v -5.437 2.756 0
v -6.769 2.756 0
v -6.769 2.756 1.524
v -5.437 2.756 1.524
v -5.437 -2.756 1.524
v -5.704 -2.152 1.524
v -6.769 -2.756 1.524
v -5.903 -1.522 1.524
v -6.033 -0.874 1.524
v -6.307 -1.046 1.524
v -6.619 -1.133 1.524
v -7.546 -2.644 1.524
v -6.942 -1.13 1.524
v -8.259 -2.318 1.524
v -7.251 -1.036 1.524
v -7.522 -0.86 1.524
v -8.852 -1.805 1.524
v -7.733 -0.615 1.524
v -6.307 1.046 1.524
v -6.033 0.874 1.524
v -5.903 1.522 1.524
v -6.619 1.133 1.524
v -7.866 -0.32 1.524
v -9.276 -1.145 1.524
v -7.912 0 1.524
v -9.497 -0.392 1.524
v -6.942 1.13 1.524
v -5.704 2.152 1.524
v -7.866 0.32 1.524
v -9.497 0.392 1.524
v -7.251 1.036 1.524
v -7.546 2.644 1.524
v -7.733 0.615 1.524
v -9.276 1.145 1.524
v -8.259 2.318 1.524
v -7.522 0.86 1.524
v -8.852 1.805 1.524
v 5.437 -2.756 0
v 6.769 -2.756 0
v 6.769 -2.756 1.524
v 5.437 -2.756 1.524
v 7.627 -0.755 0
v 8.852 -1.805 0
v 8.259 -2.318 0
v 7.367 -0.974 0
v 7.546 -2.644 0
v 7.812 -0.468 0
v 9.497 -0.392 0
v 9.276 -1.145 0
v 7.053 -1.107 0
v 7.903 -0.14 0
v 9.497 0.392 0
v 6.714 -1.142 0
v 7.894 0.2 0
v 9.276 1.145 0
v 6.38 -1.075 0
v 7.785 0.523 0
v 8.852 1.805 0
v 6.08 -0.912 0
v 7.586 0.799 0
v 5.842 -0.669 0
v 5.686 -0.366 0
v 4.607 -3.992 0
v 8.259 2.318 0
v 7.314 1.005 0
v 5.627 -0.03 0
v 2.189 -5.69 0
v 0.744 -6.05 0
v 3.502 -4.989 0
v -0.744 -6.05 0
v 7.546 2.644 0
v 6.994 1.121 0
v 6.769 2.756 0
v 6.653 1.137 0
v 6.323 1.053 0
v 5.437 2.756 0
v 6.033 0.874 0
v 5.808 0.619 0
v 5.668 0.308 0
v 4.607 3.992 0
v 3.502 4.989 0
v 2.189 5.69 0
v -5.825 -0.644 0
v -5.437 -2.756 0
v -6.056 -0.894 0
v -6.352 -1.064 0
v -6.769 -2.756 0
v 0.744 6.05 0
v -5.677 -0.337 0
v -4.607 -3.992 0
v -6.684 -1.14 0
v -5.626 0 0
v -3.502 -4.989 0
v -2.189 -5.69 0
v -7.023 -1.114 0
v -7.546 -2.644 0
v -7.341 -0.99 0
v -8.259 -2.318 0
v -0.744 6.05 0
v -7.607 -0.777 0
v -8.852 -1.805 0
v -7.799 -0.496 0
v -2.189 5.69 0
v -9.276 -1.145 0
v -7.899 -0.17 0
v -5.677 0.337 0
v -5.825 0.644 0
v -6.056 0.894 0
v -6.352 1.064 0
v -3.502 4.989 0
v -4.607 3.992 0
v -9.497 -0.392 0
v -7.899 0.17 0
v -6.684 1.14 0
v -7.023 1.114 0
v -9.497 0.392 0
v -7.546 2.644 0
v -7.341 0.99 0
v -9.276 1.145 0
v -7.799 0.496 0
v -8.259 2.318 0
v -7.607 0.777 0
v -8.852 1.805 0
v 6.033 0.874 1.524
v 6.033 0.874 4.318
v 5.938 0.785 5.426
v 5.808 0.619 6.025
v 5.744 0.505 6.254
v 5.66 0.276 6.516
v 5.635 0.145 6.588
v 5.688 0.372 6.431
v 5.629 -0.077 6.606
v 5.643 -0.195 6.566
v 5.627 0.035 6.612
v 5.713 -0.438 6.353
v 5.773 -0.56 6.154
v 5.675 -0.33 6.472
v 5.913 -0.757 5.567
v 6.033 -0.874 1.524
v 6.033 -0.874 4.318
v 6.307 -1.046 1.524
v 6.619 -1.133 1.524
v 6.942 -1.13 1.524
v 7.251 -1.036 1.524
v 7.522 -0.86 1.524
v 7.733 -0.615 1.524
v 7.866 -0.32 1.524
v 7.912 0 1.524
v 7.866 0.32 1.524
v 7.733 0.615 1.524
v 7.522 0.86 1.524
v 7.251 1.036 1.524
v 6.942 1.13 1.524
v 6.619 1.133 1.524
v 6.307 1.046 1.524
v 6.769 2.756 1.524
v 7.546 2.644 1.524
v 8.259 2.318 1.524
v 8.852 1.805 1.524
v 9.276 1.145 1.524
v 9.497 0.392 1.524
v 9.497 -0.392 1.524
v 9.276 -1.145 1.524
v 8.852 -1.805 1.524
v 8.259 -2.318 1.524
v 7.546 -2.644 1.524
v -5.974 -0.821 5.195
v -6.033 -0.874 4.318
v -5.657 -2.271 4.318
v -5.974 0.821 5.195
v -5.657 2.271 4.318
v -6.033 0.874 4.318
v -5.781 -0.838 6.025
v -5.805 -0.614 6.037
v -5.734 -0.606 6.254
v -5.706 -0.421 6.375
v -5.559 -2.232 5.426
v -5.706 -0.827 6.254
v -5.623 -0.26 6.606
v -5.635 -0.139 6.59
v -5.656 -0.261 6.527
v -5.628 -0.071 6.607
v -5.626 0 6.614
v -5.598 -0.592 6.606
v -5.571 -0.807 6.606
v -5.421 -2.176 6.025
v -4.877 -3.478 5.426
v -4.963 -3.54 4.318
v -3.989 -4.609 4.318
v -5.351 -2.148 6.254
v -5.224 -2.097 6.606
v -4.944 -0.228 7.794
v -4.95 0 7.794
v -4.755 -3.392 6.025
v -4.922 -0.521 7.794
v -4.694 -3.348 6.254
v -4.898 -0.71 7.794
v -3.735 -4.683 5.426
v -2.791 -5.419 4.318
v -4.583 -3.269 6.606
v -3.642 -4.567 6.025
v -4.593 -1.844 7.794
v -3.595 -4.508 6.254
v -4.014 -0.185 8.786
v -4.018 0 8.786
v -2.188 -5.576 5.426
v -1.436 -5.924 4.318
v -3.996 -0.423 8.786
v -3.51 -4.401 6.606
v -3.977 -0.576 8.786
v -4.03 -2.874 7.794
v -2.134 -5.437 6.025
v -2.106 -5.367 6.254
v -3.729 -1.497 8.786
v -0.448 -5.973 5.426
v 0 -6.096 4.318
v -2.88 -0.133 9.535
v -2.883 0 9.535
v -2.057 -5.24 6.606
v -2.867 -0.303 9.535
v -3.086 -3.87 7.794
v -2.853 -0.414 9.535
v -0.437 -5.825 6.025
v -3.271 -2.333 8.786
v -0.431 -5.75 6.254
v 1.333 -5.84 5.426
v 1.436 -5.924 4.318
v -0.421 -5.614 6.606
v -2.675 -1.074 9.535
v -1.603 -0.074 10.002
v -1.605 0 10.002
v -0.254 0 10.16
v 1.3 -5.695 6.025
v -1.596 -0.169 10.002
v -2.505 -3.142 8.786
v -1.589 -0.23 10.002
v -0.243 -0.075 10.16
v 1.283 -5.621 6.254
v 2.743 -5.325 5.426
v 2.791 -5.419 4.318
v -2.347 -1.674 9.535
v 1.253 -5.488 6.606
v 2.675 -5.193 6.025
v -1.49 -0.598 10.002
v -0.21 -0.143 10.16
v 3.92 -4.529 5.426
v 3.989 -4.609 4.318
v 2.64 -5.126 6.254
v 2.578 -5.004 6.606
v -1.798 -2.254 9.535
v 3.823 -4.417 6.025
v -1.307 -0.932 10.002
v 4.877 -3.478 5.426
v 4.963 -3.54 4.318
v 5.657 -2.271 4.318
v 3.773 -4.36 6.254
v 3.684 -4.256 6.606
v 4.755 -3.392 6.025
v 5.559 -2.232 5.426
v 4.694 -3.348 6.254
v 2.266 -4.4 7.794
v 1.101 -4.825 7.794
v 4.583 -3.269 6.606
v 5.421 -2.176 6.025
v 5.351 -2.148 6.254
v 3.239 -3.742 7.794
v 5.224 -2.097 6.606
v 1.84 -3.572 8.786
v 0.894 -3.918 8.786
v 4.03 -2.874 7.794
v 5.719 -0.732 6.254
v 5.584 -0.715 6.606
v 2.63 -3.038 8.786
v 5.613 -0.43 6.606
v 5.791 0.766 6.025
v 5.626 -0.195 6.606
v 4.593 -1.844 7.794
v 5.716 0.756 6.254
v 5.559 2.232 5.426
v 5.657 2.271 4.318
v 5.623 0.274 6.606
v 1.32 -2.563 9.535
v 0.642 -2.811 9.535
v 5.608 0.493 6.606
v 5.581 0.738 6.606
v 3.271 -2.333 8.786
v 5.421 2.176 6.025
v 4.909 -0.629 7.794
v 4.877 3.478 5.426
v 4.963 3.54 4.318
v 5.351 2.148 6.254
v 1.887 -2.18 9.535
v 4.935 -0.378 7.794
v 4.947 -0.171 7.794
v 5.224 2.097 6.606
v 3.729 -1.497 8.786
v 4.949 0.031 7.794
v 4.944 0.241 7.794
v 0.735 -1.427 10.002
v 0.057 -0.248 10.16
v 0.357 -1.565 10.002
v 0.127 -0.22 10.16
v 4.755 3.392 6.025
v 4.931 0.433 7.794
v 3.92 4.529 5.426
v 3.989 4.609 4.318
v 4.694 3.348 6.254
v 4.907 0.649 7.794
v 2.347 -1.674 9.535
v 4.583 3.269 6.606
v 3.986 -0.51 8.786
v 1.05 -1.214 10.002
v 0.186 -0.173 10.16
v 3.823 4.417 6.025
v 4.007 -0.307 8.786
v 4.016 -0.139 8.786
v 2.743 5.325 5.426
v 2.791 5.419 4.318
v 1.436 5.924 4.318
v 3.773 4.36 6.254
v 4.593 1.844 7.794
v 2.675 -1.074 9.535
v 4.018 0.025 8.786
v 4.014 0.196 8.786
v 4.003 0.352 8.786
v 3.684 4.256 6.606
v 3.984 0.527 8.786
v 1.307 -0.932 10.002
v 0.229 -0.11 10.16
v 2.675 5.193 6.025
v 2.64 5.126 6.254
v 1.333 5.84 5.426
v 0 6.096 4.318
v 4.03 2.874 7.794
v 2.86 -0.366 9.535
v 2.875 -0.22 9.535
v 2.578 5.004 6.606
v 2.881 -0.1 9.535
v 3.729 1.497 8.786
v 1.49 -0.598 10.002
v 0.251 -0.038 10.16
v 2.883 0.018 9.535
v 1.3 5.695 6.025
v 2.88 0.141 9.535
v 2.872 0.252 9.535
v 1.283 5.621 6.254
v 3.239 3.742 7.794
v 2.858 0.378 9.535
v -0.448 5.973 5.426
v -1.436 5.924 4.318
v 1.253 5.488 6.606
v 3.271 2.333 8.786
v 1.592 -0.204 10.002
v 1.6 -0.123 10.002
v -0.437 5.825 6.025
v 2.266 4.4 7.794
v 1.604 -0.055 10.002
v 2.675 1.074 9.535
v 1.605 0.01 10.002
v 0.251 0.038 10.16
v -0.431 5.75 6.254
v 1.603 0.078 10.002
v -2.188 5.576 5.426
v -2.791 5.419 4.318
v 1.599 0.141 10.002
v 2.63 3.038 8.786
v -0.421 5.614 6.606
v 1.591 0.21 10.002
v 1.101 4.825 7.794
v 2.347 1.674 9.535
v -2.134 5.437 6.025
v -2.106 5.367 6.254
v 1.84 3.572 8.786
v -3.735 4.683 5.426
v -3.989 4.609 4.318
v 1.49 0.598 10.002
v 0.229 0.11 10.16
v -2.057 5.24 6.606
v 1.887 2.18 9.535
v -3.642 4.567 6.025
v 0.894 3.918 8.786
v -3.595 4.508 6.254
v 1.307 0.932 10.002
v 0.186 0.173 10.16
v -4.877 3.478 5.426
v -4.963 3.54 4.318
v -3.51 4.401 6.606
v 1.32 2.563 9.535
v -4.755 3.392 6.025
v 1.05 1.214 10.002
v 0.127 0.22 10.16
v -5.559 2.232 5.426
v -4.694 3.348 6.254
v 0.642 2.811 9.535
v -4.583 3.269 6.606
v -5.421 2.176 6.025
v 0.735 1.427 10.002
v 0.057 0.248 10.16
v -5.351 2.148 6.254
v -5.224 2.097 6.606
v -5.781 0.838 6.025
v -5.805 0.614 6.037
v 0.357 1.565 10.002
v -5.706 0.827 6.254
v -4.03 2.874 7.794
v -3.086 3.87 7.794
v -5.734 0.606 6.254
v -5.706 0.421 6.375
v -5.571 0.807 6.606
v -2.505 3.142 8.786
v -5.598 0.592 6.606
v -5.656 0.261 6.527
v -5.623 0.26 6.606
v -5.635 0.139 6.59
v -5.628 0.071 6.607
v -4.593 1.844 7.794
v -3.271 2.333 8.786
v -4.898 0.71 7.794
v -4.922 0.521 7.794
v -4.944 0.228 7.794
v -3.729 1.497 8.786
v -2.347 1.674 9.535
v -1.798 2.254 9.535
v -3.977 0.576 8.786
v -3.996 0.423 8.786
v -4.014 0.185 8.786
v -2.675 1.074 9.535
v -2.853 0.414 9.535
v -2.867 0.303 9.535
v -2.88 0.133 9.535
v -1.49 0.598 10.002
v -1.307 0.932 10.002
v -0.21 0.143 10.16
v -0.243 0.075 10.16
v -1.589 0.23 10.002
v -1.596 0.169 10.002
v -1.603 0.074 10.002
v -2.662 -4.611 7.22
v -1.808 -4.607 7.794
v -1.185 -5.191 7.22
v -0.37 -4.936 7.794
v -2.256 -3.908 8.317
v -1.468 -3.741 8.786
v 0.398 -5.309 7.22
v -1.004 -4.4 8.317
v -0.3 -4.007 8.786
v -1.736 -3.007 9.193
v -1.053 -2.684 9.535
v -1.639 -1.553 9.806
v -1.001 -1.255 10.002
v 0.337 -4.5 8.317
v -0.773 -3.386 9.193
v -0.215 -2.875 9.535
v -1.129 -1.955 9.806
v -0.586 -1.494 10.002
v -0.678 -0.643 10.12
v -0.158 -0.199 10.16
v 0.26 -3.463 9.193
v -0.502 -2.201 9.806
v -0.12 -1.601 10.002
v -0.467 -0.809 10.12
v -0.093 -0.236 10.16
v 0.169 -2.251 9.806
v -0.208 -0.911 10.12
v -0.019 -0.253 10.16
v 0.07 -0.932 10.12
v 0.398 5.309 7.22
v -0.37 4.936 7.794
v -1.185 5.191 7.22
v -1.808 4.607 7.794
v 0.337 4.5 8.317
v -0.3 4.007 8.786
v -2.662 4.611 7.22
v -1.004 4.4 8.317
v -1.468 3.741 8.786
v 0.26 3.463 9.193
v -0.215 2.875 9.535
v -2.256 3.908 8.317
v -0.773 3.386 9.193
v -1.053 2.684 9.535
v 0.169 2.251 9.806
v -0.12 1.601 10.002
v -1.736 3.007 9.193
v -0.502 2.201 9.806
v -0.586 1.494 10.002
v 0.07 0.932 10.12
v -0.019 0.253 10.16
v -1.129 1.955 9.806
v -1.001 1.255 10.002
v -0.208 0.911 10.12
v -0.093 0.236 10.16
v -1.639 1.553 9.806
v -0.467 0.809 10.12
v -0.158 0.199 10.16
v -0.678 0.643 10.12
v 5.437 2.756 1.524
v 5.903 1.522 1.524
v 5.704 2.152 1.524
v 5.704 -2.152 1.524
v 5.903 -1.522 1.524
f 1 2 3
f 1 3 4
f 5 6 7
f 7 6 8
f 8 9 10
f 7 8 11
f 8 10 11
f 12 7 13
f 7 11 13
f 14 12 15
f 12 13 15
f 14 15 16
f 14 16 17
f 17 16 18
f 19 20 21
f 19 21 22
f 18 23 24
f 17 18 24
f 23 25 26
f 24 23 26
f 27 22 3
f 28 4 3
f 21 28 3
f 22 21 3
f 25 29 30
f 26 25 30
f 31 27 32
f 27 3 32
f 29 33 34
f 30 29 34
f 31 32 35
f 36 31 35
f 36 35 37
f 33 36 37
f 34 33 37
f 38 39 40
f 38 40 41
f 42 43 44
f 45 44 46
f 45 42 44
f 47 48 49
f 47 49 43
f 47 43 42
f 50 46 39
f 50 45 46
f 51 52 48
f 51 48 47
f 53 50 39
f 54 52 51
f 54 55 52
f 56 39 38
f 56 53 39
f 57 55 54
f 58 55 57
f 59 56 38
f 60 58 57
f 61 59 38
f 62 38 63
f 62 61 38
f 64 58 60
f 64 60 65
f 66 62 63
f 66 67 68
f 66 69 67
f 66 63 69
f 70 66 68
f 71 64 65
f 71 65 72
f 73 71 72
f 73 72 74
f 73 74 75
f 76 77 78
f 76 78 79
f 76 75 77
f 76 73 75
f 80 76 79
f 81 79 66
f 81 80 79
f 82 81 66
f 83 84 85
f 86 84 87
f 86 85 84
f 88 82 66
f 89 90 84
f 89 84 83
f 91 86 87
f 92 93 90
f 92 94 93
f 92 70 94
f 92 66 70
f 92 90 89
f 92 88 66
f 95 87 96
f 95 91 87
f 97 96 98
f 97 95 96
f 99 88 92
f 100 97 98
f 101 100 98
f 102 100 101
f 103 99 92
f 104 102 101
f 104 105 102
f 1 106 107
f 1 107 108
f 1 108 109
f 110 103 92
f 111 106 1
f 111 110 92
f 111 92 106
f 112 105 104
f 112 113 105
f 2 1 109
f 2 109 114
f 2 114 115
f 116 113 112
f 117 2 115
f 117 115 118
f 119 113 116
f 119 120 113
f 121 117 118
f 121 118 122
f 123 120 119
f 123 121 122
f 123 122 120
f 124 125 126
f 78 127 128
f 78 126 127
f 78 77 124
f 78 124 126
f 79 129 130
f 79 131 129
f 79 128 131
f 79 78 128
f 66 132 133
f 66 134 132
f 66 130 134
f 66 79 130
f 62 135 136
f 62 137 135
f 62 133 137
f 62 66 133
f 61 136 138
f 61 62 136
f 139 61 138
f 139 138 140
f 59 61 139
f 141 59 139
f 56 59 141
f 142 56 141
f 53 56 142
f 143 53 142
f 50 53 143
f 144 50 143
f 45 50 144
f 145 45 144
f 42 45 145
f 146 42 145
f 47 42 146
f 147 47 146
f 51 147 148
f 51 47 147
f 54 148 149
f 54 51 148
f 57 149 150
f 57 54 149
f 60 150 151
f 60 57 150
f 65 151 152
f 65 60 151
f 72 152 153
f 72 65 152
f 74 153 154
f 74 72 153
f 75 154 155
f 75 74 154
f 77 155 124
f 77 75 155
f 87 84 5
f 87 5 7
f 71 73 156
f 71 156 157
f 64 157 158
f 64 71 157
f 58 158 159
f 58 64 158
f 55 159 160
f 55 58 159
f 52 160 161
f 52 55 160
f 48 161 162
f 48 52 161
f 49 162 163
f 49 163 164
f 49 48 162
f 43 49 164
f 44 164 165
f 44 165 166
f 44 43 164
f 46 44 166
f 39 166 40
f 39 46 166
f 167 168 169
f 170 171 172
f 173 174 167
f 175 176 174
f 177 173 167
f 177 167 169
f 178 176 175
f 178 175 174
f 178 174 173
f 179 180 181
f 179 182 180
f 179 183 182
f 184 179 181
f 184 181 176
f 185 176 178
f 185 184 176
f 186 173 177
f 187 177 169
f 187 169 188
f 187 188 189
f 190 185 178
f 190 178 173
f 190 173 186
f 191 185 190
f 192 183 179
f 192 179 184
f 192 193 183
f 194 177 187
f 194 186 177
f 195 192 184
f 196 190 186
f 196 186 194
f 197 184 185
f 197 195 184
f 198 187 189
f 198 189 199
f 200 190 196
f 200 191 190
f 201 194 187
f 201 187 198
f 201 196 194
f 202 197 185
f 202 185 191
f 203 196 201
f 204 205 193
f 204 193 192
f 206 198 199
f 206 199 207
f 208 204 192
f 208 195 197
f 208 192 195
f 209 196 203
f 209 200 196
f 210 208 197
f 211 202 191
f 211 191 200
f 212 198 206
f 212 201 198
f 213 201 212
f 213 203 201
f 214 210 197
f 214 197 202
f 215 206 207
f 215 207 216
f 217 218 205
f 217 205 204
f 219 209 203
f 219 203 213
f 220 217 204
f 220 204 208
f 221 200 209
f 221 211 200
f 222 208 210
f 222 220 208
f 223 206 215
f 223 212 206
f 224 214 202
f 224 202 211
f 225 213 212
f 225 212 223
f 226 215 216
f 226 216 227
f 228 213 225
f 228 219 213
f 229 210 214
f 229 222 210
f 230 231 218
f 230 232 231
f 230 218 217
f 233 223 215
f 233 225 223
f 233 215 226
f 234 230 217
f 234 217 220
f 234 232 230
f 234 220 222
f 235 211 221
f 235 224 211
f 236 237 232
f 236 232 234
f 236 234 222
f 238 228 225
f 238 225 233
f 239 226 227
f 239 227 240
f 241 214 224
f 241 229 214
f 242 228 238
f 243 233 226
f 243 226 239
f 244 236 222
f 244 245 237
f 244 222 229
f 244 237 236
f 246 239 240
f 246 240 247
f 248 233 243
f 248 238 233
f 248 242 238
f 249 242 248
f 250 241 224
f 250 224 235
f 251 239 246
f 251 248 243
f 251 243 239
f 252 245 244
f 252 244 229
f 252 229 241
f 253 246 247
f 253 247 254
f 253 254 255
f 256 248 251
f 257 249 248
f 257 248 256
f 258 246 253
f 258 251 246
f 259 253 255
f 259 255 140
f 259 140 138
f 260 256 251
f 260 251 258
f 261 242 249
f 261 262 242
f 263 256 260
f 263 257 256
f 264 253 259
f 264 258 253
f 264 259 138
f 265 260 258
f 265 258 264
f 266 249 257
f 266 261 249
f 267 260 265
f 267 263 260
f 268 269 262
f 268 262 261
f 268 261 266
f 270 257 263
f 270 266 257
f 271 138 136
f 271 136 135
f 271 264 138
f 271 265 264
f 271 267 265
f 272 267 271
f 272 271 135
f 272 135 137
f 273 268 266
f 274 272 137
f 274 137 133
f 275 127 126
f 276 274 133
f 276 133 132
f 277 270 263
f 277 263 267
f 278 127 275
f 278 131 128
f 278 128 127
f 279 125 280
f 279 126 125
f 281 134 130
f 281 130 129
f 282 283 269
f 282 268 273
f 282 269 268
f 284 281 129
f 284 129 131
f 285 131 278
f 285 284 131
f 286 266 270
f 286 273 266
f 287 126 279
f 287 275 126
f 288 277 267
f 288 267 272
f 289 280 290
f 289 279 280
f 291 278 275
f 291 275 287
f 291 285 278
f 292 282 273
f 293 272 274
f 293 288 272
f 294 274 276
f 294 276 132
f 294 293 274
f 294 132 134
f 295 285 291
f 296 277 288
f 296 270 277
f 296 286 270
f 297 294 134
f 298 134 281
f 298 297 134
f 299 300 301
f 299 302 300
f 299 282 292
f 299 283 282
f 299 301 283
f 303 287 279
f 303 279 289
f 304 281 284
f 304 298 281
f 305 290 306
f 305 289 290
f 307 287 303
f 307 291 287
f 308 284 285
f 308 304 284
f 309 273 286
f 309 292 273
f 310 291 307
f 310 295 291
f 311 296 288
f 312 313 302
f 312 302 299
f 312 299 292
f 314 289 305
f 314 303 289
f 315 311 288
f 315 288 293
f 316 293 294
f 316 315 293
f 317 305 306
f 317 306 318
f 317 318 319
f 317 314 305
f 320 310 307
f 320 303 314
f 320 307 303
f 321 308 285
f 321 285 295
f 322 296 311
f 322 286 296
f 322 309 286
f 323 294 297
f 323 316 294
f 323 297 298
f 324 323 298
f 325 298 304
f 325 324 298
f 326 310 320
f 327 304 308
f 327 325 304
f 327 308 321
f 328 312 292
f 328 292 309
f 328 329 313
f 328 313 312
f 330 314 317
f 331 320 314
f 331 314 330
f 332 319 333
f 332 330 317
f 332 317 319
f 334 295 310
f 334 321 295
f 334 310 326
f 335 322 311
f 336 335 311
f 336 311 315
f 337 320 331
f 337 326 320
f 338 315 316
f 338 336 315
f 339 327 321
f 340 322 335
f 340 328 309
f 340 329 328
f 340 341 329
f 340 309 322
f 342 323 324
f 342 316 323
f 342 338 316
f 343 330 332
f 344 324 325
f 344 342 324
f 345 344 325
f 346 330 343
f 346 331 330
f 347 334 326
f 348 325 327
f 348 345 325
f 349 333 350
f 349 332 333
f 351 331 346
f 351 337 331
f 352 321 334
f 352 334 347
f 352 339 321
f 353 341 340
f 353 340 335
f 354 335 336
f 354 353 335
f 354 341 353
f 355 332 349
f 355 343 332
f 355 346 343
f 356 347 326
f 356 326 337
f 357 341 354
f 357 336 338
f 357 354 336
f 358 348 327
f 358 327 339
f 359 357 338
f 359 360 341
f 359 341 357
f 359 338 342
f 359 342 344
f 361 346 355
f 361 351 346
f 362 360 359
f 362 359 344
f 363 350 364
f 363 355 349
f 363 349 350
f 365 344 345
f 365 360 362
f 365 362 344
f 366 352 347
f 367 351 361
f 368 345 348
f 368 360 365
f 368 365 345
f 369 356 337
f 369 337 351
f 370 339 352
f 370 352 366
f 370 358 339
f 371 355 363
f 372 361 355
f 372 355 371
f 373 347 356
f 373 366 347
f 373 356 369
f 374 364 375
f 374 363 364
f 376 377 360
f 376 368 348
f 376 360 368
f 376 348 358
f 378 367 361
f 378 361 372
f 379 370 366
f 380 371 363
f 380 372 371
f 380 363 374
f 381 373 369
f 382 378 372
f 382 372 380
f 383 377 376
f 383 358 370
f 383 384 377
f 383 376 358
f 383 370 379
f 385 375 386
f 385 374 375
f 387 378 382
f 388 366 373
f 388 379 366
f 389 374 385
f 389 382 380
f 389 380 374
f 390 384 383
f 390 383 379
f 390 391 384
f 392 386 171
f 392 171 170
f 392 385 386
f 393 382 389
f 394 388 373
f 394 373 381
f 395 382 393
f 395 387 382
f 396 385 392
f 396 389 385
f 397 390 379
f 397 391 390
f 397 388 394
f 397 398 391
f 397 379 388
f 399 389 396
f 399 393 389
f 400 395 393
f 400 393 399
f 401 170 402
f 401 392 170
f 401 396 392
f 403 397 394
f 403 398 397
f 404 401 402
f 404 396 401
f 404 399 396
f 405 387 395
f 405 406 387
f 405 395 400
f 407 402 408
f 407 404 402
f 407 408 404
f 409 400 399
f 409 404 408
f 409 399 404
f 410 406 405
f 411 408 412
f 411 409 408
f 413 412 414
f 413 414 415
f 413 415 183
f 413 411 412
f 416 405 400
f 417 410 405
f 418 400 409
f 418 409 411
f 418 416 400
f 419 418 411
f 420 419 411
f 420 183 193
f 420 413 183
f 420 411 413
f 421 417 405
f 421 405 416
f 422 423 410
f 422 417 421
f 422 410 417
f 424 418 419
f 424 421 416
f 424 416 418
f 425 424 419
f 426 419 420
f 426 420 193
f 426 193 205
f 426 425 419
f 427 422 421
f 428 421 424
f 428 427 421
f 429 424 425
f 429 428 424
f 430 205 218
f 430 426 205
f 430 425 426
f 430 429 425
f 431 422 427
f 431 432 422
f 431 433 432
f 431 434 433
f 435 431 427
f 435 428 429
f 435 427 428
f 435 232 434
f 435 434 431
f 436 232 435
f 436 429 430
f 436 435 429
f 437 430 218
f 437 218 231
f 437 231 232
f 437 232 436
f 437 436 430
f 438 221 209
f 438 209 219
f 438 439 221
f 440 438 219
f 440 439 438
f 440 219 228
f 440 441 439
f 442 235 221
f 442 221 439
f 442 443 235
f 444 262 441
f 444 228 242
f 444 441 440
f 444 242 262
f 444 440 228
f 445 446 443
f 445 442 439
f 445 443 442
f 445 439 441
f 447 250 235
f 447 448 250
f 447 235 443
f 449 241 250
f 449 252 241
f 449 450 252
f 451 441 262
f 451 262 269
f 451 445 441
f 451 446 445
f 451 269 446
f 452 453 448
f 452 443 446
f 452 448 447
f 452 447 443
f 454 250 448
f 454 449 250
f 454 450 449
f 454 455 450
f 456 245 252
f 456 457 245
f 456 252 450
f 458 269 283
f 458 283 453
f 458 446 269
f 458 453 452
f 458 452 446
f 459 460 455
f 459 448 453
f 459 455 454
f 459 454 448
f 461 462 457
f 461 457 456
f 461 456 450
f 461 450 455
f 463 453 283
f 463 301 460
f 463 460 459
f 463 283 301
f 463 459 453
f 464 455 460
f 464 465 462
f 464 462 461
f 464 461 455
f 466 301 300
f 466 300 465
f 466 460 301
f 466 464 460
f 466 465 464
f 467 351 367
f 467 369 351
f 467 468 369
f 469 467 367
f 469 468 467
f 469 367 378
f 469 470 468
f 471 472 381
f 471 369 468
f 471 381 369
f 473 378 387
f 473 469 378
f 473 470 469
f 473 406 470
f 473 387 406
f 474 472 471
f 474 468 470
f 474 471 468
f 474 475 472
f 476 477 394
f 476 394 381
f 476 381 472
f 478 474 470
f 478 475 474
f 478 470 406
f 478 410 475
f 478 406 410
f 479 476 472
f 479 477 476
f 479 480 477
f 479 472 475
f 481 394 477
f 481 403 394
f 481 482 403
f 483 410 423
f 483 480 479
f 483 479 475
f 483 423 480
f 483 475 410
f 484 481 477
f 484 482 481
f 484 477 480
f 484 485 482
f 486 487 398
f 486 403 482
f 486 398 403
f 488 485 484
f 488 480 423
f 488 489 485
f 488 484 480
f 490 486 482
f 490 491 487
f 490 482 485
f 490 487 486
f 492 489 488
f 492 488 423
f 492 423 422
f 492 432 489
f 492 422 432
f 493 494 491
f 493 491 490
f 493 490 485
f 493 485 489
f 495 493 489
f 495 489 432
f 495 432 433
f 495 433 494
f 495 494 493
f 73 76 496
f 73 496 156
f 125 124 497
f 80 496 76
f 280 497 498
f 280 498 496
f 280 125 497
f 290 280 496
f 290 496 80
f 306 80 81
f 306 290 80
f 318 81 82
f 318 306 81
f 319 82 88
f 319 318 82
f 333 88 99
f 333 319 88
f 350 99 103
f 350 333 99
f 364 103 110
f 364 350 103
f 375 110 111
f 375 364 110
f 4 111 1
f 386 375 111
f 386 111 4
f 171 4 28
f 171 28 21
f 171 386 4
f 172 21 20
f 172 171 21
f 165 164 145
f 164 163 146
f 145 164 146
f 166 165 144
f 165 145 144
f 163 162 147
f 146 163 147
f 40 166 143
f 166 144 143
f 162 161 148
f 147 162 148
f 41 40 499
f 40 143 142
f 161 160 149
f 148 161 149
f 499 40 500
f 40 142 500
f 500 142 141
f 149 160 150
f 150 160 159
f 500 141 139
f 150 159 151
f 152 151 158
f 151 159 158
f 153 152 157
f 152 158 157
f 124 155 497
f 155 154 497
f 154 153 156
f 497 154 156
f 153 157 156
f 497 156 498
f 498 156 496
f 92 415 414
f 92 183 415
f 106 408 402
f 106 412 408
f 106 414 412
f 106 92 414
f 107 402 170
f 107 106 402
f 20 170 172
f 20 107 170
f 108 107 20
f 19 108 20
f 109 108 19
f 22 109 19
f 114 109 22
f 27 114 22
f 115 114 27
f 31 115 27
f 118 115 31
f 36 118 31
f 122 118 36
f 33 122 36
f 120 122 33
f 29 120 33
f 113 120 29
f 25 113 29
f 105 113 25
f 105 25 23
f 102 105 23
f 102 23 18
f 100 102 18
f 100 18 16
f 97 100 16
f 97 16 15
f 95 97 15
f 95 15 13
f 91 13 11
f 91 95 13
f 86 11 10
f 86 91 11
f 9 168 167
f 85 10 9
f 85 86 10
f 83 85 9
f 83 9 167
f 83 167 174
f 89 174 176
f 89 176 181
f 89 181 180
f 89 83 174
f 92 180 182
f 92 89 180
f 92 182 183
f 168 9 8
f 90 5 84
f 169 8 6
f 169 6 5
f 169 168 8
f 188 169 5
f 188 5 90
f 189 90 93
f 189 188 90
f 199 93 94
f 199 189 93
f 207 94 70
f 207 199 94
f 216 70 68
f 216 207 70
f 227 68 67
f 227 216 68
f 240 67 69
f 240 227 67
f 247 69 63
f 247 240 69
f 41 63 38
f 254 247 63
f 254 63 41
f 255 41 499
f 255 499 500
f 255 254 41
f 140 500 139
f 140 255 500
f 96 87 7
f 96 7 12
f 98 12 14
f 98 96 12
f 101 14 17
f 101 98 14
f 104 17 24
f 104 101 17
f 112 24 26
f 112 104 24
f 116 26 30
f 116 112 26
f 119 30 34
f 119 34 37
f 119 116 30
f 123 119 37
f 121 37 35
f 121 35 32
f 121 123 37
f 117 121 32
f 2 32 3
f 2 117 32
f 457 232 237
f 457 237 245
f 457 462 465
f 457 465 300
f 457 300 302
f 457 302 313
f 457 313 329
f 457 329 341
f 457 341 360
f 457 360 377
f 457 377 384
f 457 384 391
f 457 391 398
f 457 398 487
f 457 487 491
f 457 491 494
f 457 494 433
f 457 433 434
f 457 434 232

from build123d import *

# Parameters (mm, degrees)
BOSS_EXTRUDE1_DEPTH = 1.524
SKETCH4_R           = 1.143
CUT_EXTRUDE6_DEPTH  = 28.702


with BuildPart() as part:
    # Sketch1 → Boss-Extrude1 (new body)
    with BuildSketch(Plane.XY):
        with BuildLine():
            Line((6.7691, -2.7559), (-6.7691, -2.7559))
            ThreePointArc((-6.7691, -2.7559), (-9.525, 0), (-6.7691, 2.7559))
            Line((-6.7691, 2.7559), (6.7691, 2.7559))
            ThreePointArc((6.7691, 2.7559), (9.525, 0), (6.7691, -2.7559))
        make_face()
    extrude(amount=BOSS_EXTRUDE1_DEPTH)

    # Sketch2 → Revolve2 (revolve)
    with BuildSketch(Plane(origin=(0, 0, 0), x_dir=(1, 0, 0), z_dir=(0, 1, 0)), mode=Mode.PRIVATE) as revolve2_sk:
        with BuildLine():
            Line((0, 0), (6.096, 0))
            Line((6.096, 0), (6.096, -4.318))
            ThreePointArc((6.096, -4.318), (4.384917816, -8.448917816), (0.254, -10.16))
            Line((0.254, -10.16), (0, -10.16))
            Line((0, -10.16), (0, 0))
        make_face()
    revolve(revolve2_sk.sketch.rotate(Axis((0, 0, 0), (0, 0, 1)), 180), axis=Axis((0, 0, 0), (0, 0, 1)))

    # Sketch4 → Cut-Extrude6 (cut)
    with BuildSketch(Plane.XY):
        with Locations((-6.7691, 0)):
            Circle(SKETCH4_R)
        with Locations(Location((6.7691, 0, 0), (0, 0, 130.093582501))):
            Circle(SKETCH4_R)
    extrude(amount=CUT_EXTRUDE6_DEPTH, mode=Mode.SUBTRACT)


solid = part.part
